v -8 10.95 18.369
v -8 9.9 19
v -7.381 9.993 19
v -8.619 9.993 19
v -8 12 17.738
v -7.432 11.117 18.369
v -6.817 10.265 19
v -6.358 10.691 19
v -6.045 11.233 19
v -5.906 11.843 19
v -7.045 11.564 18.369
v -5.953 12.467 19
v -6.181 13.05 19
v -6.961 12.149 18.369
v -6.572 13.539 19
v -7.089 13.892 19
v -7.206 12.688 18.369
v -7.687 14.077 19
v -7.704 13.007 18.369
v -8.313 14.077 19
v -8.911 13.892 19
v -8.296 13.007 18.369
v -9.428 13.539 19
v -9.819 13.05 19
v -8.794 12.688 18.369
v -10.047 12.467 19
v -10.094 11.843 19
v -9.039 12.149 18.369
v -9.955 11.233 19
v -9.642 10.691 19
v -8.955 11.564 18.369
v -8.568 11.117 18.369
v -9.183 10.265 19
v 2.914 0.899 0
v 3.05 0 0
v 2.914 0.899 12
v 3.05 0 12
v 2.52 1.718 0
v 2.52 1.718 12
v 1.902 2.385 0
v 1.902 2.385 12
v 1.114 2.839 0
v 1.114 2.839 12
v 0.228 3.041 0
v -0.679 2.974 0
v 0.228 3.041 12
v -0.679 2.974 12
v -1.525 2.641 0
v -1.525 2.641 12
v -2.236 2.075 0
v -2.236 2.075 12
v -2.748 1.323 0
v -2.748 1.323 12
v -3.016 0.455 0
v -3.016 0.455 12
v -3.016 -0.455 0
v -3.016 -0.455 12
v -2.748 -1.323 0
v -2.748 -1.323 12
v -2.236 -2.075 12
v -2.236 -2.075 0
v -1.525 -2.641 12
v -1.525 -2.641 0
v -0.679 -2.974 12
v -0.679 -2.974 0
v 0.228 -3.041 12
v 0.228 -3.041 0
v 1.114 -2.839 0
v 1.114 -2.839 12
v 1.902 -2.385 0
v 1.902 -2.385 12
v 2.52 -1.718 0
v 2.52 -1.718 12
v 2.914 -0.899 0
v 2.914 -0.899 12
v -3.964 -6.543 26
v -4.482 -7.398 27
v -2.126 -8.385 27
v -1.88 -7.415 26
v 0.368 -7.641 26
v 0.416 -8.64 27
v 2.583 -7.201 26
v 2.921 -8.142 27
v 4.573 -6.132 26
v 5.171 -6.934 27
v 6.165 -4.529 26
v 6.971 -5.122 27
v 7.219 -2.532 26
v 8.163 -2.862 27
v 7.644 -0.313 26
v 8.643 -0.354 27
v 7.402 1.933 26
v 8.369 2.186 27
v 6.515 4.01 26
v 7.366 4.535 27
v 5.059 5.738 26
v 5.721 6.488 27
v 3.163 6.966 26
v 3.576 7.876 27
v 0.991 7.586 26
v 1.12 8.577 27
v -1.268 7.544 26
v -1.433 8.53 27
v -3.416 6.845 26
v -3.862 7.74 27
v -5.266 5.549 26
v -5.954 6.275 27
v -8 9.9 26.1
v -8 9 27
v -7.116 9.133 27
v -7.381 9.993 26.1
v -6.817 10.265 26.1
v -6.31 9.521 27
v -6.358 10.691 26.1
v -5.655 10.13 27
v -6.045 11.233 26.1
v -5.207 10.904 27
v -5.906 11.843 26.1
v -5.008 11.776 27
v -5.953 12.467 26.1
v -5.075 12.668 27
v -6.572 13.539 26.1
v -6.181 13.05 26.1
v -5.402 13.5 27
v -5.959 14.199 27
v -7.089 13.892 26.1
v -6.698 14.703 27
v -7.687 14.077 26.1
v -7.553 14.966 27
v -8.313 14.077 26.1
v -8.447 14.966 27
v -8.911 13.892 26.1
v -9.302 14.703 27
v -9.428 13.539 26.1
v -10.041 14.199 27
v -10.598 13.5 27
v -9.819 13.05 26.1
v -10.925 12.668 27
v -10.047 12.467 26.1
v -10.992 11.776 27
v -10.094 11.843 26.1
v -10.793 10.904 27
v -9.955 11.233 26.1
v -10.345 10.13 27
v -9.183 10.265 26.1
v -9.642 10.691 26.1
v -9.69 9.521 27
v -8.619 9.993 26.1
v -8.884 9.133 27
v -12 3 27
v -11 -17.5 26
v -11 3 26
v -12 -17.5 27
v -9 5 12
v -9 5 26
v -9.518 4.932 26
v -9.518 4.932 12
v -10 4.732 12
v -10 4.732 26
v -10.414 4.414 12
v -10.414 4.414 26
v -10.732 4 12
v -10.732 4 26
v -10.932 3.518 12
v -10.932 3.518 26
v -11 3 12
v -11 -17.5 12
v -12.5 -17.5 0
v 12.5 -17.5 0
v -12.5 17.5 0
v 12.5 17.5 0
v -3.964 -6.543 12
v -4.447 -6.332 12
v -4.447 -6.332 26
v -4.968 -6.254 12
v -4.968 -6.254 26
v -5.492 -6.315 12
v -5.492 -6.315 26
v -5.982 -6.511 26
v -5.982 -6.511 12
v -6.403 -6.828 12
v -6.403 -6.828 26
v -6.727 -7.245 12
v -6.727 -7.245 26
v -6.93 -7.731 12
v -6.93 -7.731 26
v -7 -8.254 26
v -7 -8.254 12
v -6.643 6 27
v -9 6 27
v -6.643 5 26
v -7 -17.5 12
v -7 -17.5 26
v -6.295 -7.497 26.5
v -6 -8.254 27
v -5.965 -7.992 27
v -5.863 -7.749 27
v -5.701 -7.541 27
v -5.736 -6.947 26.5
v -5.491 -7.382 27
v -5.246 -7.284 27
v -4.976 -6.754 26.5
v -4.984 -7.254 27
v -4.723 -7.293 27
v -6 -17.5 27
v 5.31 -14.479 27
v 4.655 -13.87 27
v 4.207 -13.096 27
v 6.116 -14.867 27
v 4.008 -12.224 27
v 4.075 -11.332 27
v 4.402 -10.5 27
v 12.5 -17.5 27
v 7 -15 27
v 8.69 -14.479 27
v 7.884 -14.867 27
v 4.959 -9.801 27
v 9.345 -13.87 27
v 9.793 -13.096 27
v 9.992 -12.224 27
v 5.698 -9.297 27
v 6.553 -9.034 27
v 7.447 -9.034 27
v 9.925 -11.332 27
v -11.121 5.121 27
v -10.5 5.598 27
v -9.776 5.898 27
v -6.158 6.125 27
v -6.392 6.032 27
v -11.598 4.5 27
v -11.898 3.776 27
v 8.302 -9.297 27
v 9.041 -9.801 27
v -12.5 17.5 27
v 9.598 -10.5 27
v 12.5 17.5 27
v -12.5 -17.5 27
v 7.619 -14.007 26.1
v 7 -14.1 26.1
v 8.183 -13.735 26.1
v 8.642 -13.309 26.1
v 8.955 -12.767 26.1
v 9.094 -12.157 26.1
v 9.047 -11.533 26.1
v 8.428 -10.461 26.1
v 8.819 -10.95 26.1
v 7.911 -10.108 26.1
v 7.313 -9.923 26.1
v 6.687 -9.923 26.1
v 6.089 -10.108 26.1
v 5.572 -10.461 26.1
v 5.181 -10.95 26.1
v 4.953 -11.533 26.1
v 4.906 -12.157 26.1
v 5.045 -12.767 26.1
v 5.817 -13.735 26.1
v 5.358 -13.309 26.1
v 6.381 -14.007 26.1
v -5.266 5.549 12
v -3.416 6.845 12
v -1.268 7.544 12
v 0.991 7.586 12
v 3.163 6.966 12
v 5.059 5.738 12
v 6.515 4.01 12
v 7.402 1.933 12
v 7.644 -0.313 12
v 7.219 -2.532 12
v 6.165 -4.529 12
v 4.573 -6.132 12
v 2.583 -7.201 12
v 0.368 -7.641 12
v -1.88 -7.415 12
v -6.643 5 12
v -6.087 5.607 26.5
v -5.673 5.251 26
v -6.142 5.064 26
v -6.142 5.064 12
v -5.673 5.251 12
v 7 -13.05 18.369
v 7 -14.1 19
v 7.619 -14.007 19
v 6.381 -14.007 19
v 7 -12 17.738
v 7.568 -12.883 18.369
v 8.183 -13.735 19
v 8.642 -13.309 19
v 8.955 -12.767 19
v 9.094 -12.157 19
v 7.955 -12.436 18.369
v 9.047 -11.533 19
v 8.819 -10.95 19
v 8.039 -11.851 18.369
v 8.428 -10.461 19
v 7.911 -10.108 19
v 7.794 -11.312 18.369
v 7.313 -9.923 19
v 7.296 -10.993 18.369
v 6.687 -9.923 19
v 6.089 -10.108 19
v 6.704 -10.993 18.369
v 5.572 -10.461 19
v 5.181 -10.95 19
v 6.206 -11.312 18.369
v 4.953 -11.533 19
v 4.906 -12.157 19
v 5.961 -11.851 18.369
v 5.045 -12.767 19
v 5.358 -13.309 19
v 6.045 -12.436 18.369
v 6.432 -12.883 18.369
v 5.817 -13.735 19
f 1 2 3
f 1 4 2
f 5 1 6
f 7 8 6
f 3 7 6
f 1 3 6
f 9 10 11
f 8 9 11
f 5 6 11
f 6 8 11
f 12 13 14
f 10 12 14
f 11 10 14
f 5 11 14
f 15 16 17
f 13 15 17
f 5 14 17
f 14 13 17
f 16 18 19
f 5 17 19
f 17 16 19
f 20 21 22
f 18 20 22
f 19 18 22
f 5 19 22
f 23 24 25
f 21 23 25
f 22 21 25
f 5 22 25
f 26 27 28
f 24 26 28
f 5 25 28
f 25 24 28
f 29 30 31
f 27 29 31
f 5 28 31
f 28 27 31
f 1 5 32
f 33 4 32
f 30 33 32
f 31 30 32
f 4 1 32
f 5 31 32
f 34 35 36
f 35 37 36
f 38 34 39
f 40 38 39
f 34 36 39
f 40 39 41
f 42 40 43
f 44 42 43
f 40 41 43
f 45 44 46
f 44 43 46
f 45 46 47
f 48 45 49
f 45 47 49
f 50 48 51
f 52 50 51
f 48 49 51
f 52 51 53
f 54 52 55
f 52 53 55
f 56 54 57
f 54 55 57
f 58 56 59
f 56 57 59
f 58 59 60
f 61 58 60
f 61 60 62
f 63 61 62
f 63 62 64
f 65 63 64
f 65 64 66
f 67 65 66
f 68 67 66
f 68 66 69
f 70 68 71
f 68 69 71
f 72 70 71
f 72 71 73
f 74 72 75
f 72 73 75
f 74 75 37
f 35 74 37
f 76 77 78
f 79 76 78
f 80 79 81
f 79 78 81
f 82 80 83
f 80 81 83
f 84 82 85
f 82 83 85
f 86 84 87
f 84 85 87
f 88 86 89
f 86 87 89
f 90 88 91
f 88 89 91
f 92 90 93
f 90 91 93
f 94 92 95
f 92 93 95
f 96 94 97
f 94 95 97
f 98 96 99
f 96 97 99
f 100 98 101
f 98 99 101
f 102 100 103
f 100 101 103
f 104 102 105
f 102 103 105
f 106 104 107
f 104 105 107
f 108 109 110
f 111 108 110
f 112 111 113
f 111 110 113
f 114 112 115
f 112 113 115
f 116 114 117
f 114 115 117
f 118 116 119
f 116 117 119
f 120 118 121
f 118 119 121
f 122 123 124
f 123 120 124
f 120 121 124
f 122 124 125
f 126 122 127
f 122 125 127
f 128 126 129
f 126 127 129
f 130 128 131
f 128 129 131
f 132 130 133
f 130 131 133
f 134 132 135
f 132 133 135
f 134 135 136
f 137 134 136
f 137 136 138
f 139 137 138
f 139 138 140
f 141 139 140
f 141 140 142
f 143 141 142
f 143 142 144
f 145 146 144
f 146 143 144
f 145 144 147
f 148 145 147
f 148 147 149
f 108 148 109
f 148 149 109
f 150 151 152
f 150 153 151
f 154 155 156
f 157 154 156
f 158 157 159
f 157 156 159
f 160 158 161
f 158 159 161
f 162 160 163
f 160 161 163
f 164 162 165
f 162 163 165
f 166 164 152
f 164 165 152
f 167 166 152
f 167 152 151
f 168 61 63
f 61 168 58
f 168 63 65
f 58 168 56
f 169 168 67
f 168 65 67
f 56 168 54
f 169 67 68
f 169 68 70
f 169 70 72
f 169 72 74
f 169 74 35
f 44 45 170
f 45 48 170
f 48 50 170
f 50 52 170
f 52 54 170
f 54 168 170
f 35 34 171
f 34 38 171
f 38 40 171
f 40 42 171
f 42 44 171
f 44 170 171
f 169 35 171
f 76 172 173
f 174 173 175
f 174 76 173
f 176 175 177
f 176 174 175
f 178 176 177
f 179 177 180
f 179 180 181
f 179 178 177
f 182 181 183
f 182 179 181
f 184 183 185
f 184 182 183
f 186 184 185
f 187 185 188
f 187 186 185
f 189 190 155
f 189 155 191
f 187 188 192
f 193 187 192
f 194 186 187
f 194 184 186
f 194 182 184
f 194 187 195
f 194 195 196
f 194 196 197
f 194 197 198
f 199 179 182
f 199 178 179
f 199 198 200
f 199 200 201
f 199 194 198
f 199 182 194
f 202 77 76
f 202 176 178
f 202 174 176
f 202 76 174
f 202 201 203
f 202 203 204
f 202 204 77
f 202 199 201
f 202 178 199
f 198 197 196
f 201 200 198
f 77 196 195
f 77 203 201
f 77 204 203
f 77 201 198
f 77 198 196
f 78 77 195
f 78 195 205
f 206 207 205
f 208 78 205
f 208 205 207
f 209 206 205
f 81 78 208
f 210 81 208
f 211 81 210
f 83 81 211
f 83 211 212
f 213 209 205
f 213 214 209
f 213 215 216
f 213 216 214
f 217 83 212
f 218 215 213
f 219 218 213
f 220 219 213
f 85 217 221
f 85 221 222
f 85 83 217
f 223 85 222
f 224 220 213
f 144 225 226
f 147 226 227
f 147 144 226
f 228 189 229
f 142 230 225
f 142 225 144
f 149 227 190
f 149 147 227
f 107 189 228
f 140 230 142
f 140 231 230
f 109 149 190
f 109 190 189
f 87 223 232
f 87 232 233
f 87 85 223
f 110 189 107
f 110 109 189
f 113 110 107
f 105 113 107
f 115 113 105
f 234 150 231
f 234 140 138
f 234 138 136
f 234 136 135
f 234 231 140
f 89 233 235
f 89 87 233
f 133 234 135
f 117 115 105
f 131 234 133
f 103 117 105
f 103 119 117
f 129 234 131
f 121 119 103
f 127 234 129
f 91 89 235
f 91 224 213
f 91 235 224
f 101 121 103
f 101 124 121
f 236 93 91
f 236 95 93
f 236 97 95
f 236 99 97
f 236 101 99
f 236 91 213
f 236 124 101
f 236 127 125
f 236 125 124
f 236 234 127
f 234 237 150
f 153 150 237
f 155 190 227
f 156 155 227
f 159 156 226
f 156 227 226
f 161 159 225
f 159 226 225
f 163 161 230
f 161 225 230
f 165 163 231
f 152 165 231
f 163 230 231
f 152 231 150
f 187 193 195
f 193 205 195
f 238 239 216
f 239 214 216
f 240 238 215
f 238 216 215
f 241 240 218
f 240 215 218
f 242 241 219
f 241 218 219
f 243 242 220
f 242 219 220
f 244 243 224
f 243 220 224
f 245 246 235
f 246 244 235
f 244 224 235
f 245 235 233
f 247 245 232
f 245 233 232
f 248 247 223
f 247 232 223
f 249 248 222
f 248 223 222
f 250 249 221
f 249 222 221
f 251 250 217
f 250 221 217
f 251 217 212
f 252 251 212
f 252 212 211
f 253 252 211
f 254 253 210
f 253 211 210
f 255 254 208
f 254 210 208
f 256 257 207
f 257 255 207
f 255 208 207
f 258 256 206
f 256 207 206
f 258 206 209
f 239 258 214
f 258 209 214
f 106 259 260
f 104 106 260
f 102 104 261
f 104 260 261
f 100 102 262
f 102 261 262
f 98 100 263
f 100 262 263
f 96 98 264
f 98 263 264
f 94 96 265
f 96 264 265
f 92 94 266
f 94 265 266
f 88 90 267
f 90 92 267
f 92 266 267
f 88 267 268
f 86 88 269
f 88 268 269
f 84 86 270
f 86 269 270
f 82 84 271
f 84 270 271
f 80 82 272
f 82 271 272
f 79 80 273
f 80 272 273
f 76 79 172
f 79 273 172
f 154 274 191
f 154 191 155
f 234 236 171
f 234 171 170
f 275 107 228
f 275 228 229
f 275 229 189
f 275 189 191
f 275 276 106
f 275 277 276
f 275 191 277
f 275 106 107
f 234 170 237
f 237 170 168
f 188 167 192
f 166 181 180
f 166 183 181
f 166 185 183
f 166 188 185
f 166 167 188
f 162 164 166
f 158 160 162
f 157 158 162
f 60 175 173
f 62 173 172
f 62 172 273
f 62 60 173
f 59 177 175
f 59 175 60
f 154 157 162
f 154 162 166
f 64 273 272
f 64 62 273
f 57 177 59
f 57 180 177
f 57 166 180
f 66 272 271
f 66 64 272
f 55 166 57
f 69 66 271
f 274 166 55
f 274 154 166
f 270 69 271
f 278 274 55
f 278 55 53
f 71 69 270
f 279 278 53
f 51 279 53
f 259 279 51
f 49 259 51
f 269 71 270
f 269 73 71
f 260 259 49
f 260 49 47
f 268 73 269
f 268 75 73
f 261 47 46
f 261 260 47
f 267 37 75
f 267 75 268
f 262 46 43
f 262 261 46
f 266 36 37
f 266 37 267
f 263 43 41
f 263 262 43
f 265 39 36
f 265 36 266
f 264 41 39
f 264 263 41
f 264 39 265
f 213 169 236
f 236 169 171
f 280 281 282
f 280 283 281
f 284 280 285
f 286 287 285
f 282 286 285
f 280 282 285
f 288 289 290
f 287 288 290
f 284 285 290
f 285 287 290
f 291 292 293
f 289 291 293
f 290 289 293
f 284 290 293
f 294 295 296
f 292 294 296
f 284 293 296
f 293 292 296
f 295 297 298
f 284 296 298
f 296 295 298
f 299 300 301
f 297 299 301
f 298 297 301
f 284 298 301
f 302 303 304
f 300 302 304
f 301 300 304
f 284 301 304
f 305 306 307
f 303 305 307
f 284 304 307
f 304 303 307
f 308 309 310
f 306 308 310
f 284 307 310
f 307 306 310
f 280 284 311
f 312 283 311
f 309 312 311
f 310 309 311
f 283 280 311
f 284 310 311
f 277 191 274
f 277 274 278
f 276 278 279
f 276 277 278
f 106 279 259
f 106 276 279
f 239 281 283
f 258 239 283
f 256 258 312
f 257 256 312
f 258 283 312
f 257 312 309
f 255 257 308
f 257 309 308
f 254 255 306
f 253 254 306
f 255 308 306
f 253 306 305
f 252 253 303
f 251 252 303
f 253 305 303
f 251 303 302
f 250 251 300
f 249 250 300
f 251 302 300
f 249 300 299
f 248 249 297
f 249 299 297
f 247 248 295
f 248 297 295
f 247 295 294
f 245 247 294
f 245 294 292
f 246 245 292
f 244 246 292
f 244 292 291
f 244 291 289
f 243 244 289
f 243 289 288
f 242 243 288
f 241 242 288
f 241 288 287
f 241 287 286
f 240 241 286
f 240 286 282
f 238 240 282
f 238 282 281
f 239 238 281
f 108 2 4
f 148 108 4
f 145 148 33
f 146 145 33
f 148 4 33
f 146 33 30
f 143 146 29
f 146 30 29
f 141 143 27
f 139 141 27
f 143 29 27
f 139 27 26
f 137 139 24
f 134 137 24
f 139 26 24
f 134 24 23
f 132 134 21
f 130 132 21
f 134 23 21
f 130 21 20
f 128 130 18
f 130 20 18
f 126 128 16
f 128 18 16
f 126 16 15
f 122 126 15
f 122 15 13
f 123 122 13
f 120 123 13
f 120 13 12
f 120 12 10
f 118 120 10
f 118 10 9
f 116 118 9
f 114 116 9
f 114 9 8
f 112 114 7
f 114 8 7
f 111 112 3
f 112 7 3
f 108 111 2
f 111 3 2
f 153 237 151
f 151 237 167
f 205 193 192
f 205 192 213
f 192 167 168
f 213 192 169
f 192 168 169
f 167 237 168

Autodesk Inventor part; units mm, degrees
ref_plane "YZ Plane" through (0, 0, 0) normal (1, 0, 0) x (0, 1, 0)
ref_plane "XZ Plane" through (0, 0, 0) normal (0, 1, 0) x (-1, 0, 0)
ref_plane "XY Plane" through (0, 0, 0) normal (0, 0, 1) x (1, 0, 0)
sketch "Sketch1" plane through (0, 0, 0) normal (0, 0, 1) x (1, 0, 0)
  line L0 (12.5, 17.5) -> (-12.5, 17.5)
  line L1 (-12.5, 17.5) -> (-12.5, -17.5)
  line L2 (-12.5, -17.5) -> (12.5, -17.5)
  line L3 (12.5, -17.5) -> (12.5, 17.5)
  point P0 (0, 0)
  point P1 (12.5, 0)
  dimension "d0" = 25
  dimension "d1" = 35
  dimension "d16" = 12.5
extrude "Extrusion1" add sketch "Sketch1" along normal blind 12
sketch "Sketch2" plane through (0, 0, 12) normal (0, 0, 1) x (1, 0, 0)
  circle A0 centre (0, 0) radius 3.05
  dimension "d4" = 6.1
extrude "Extrusion2" cut sketch "Sketch2" against normal up to next
sketch "Sketch4" plane through (0, 0, 12) normal (0, 0, 1) x (1, 0, 0)
  circle A0 centre (0, 0) radius 3.05 projected
  arc A1 (-7, -3.0859) -> (-5.7899, 5) centre (0, 0) ccw
  line L0 (-5.7899, 5) -> (-11, 5)
  line L1 (-11, 5) -> (-11, -17.5)
  line L2 (-12.5, -17.5) -> (12.5, -17.5) projected
  line L3 (-7, -3.0859) -> (-7, -17.5)
  circle A2 centre (0, 0) radius 3.05 projected
  line L4 (12.5, 17.5) -> (-12.5, 17.5) projected
  line L5 (-12.5, 17.5) -> (-12.5, -17.5) projected
  line L6 (-12.5, -17.5) -> (12.5, -17.5) projected
  line L7 (12.5, -17.5) -> (12.5, 17.5) projected
  dimension "d9" = 15.3
  dimension "d10" = 11
  dimension "d11" = 7
  dimension "d12" = 5
extrude "Extrusion3" add sketch "Sketch4" along normal blind 15 contours A1 L0 L1 L2 L5 L4 L7 L3
fillet "Fillet1" radius 2 3 edges at (-7, -3.0859, 19.5) (-5.7899, 5, 19.5) (-11, 5, 19.5)
sketch "Sketch5" plane through (0, 0, 27) normal (0, 0, 1) x (1, 0, 0)
  point P0 (0, 0)
  point P1 (-8, 12)
  point P2 (7, -12)
  dimension "d17" = 7
  dimension "d18" = 12
  dimension "d19" = 12
  dimension "d20" = 8
hole "Hole1" at (-8, 12, 27) at (7, -12, 27) direction (0, 0, -1) diameter 4.2 depth 8 tip angle 118 countersink diameter 6 countersink angle 90
chamfer "Chamfer1" distance 1 angle 45 6 edges at (7.606, 0.819, 27) (-5.9817, -6.5111, 27) (-7, -12.8768, 27) (-5.9014, 5.1424, 27) (-7.8212, 5, 27) (-11, -7.25, 27)
properties part number "Base" material "ABS Plastic"
